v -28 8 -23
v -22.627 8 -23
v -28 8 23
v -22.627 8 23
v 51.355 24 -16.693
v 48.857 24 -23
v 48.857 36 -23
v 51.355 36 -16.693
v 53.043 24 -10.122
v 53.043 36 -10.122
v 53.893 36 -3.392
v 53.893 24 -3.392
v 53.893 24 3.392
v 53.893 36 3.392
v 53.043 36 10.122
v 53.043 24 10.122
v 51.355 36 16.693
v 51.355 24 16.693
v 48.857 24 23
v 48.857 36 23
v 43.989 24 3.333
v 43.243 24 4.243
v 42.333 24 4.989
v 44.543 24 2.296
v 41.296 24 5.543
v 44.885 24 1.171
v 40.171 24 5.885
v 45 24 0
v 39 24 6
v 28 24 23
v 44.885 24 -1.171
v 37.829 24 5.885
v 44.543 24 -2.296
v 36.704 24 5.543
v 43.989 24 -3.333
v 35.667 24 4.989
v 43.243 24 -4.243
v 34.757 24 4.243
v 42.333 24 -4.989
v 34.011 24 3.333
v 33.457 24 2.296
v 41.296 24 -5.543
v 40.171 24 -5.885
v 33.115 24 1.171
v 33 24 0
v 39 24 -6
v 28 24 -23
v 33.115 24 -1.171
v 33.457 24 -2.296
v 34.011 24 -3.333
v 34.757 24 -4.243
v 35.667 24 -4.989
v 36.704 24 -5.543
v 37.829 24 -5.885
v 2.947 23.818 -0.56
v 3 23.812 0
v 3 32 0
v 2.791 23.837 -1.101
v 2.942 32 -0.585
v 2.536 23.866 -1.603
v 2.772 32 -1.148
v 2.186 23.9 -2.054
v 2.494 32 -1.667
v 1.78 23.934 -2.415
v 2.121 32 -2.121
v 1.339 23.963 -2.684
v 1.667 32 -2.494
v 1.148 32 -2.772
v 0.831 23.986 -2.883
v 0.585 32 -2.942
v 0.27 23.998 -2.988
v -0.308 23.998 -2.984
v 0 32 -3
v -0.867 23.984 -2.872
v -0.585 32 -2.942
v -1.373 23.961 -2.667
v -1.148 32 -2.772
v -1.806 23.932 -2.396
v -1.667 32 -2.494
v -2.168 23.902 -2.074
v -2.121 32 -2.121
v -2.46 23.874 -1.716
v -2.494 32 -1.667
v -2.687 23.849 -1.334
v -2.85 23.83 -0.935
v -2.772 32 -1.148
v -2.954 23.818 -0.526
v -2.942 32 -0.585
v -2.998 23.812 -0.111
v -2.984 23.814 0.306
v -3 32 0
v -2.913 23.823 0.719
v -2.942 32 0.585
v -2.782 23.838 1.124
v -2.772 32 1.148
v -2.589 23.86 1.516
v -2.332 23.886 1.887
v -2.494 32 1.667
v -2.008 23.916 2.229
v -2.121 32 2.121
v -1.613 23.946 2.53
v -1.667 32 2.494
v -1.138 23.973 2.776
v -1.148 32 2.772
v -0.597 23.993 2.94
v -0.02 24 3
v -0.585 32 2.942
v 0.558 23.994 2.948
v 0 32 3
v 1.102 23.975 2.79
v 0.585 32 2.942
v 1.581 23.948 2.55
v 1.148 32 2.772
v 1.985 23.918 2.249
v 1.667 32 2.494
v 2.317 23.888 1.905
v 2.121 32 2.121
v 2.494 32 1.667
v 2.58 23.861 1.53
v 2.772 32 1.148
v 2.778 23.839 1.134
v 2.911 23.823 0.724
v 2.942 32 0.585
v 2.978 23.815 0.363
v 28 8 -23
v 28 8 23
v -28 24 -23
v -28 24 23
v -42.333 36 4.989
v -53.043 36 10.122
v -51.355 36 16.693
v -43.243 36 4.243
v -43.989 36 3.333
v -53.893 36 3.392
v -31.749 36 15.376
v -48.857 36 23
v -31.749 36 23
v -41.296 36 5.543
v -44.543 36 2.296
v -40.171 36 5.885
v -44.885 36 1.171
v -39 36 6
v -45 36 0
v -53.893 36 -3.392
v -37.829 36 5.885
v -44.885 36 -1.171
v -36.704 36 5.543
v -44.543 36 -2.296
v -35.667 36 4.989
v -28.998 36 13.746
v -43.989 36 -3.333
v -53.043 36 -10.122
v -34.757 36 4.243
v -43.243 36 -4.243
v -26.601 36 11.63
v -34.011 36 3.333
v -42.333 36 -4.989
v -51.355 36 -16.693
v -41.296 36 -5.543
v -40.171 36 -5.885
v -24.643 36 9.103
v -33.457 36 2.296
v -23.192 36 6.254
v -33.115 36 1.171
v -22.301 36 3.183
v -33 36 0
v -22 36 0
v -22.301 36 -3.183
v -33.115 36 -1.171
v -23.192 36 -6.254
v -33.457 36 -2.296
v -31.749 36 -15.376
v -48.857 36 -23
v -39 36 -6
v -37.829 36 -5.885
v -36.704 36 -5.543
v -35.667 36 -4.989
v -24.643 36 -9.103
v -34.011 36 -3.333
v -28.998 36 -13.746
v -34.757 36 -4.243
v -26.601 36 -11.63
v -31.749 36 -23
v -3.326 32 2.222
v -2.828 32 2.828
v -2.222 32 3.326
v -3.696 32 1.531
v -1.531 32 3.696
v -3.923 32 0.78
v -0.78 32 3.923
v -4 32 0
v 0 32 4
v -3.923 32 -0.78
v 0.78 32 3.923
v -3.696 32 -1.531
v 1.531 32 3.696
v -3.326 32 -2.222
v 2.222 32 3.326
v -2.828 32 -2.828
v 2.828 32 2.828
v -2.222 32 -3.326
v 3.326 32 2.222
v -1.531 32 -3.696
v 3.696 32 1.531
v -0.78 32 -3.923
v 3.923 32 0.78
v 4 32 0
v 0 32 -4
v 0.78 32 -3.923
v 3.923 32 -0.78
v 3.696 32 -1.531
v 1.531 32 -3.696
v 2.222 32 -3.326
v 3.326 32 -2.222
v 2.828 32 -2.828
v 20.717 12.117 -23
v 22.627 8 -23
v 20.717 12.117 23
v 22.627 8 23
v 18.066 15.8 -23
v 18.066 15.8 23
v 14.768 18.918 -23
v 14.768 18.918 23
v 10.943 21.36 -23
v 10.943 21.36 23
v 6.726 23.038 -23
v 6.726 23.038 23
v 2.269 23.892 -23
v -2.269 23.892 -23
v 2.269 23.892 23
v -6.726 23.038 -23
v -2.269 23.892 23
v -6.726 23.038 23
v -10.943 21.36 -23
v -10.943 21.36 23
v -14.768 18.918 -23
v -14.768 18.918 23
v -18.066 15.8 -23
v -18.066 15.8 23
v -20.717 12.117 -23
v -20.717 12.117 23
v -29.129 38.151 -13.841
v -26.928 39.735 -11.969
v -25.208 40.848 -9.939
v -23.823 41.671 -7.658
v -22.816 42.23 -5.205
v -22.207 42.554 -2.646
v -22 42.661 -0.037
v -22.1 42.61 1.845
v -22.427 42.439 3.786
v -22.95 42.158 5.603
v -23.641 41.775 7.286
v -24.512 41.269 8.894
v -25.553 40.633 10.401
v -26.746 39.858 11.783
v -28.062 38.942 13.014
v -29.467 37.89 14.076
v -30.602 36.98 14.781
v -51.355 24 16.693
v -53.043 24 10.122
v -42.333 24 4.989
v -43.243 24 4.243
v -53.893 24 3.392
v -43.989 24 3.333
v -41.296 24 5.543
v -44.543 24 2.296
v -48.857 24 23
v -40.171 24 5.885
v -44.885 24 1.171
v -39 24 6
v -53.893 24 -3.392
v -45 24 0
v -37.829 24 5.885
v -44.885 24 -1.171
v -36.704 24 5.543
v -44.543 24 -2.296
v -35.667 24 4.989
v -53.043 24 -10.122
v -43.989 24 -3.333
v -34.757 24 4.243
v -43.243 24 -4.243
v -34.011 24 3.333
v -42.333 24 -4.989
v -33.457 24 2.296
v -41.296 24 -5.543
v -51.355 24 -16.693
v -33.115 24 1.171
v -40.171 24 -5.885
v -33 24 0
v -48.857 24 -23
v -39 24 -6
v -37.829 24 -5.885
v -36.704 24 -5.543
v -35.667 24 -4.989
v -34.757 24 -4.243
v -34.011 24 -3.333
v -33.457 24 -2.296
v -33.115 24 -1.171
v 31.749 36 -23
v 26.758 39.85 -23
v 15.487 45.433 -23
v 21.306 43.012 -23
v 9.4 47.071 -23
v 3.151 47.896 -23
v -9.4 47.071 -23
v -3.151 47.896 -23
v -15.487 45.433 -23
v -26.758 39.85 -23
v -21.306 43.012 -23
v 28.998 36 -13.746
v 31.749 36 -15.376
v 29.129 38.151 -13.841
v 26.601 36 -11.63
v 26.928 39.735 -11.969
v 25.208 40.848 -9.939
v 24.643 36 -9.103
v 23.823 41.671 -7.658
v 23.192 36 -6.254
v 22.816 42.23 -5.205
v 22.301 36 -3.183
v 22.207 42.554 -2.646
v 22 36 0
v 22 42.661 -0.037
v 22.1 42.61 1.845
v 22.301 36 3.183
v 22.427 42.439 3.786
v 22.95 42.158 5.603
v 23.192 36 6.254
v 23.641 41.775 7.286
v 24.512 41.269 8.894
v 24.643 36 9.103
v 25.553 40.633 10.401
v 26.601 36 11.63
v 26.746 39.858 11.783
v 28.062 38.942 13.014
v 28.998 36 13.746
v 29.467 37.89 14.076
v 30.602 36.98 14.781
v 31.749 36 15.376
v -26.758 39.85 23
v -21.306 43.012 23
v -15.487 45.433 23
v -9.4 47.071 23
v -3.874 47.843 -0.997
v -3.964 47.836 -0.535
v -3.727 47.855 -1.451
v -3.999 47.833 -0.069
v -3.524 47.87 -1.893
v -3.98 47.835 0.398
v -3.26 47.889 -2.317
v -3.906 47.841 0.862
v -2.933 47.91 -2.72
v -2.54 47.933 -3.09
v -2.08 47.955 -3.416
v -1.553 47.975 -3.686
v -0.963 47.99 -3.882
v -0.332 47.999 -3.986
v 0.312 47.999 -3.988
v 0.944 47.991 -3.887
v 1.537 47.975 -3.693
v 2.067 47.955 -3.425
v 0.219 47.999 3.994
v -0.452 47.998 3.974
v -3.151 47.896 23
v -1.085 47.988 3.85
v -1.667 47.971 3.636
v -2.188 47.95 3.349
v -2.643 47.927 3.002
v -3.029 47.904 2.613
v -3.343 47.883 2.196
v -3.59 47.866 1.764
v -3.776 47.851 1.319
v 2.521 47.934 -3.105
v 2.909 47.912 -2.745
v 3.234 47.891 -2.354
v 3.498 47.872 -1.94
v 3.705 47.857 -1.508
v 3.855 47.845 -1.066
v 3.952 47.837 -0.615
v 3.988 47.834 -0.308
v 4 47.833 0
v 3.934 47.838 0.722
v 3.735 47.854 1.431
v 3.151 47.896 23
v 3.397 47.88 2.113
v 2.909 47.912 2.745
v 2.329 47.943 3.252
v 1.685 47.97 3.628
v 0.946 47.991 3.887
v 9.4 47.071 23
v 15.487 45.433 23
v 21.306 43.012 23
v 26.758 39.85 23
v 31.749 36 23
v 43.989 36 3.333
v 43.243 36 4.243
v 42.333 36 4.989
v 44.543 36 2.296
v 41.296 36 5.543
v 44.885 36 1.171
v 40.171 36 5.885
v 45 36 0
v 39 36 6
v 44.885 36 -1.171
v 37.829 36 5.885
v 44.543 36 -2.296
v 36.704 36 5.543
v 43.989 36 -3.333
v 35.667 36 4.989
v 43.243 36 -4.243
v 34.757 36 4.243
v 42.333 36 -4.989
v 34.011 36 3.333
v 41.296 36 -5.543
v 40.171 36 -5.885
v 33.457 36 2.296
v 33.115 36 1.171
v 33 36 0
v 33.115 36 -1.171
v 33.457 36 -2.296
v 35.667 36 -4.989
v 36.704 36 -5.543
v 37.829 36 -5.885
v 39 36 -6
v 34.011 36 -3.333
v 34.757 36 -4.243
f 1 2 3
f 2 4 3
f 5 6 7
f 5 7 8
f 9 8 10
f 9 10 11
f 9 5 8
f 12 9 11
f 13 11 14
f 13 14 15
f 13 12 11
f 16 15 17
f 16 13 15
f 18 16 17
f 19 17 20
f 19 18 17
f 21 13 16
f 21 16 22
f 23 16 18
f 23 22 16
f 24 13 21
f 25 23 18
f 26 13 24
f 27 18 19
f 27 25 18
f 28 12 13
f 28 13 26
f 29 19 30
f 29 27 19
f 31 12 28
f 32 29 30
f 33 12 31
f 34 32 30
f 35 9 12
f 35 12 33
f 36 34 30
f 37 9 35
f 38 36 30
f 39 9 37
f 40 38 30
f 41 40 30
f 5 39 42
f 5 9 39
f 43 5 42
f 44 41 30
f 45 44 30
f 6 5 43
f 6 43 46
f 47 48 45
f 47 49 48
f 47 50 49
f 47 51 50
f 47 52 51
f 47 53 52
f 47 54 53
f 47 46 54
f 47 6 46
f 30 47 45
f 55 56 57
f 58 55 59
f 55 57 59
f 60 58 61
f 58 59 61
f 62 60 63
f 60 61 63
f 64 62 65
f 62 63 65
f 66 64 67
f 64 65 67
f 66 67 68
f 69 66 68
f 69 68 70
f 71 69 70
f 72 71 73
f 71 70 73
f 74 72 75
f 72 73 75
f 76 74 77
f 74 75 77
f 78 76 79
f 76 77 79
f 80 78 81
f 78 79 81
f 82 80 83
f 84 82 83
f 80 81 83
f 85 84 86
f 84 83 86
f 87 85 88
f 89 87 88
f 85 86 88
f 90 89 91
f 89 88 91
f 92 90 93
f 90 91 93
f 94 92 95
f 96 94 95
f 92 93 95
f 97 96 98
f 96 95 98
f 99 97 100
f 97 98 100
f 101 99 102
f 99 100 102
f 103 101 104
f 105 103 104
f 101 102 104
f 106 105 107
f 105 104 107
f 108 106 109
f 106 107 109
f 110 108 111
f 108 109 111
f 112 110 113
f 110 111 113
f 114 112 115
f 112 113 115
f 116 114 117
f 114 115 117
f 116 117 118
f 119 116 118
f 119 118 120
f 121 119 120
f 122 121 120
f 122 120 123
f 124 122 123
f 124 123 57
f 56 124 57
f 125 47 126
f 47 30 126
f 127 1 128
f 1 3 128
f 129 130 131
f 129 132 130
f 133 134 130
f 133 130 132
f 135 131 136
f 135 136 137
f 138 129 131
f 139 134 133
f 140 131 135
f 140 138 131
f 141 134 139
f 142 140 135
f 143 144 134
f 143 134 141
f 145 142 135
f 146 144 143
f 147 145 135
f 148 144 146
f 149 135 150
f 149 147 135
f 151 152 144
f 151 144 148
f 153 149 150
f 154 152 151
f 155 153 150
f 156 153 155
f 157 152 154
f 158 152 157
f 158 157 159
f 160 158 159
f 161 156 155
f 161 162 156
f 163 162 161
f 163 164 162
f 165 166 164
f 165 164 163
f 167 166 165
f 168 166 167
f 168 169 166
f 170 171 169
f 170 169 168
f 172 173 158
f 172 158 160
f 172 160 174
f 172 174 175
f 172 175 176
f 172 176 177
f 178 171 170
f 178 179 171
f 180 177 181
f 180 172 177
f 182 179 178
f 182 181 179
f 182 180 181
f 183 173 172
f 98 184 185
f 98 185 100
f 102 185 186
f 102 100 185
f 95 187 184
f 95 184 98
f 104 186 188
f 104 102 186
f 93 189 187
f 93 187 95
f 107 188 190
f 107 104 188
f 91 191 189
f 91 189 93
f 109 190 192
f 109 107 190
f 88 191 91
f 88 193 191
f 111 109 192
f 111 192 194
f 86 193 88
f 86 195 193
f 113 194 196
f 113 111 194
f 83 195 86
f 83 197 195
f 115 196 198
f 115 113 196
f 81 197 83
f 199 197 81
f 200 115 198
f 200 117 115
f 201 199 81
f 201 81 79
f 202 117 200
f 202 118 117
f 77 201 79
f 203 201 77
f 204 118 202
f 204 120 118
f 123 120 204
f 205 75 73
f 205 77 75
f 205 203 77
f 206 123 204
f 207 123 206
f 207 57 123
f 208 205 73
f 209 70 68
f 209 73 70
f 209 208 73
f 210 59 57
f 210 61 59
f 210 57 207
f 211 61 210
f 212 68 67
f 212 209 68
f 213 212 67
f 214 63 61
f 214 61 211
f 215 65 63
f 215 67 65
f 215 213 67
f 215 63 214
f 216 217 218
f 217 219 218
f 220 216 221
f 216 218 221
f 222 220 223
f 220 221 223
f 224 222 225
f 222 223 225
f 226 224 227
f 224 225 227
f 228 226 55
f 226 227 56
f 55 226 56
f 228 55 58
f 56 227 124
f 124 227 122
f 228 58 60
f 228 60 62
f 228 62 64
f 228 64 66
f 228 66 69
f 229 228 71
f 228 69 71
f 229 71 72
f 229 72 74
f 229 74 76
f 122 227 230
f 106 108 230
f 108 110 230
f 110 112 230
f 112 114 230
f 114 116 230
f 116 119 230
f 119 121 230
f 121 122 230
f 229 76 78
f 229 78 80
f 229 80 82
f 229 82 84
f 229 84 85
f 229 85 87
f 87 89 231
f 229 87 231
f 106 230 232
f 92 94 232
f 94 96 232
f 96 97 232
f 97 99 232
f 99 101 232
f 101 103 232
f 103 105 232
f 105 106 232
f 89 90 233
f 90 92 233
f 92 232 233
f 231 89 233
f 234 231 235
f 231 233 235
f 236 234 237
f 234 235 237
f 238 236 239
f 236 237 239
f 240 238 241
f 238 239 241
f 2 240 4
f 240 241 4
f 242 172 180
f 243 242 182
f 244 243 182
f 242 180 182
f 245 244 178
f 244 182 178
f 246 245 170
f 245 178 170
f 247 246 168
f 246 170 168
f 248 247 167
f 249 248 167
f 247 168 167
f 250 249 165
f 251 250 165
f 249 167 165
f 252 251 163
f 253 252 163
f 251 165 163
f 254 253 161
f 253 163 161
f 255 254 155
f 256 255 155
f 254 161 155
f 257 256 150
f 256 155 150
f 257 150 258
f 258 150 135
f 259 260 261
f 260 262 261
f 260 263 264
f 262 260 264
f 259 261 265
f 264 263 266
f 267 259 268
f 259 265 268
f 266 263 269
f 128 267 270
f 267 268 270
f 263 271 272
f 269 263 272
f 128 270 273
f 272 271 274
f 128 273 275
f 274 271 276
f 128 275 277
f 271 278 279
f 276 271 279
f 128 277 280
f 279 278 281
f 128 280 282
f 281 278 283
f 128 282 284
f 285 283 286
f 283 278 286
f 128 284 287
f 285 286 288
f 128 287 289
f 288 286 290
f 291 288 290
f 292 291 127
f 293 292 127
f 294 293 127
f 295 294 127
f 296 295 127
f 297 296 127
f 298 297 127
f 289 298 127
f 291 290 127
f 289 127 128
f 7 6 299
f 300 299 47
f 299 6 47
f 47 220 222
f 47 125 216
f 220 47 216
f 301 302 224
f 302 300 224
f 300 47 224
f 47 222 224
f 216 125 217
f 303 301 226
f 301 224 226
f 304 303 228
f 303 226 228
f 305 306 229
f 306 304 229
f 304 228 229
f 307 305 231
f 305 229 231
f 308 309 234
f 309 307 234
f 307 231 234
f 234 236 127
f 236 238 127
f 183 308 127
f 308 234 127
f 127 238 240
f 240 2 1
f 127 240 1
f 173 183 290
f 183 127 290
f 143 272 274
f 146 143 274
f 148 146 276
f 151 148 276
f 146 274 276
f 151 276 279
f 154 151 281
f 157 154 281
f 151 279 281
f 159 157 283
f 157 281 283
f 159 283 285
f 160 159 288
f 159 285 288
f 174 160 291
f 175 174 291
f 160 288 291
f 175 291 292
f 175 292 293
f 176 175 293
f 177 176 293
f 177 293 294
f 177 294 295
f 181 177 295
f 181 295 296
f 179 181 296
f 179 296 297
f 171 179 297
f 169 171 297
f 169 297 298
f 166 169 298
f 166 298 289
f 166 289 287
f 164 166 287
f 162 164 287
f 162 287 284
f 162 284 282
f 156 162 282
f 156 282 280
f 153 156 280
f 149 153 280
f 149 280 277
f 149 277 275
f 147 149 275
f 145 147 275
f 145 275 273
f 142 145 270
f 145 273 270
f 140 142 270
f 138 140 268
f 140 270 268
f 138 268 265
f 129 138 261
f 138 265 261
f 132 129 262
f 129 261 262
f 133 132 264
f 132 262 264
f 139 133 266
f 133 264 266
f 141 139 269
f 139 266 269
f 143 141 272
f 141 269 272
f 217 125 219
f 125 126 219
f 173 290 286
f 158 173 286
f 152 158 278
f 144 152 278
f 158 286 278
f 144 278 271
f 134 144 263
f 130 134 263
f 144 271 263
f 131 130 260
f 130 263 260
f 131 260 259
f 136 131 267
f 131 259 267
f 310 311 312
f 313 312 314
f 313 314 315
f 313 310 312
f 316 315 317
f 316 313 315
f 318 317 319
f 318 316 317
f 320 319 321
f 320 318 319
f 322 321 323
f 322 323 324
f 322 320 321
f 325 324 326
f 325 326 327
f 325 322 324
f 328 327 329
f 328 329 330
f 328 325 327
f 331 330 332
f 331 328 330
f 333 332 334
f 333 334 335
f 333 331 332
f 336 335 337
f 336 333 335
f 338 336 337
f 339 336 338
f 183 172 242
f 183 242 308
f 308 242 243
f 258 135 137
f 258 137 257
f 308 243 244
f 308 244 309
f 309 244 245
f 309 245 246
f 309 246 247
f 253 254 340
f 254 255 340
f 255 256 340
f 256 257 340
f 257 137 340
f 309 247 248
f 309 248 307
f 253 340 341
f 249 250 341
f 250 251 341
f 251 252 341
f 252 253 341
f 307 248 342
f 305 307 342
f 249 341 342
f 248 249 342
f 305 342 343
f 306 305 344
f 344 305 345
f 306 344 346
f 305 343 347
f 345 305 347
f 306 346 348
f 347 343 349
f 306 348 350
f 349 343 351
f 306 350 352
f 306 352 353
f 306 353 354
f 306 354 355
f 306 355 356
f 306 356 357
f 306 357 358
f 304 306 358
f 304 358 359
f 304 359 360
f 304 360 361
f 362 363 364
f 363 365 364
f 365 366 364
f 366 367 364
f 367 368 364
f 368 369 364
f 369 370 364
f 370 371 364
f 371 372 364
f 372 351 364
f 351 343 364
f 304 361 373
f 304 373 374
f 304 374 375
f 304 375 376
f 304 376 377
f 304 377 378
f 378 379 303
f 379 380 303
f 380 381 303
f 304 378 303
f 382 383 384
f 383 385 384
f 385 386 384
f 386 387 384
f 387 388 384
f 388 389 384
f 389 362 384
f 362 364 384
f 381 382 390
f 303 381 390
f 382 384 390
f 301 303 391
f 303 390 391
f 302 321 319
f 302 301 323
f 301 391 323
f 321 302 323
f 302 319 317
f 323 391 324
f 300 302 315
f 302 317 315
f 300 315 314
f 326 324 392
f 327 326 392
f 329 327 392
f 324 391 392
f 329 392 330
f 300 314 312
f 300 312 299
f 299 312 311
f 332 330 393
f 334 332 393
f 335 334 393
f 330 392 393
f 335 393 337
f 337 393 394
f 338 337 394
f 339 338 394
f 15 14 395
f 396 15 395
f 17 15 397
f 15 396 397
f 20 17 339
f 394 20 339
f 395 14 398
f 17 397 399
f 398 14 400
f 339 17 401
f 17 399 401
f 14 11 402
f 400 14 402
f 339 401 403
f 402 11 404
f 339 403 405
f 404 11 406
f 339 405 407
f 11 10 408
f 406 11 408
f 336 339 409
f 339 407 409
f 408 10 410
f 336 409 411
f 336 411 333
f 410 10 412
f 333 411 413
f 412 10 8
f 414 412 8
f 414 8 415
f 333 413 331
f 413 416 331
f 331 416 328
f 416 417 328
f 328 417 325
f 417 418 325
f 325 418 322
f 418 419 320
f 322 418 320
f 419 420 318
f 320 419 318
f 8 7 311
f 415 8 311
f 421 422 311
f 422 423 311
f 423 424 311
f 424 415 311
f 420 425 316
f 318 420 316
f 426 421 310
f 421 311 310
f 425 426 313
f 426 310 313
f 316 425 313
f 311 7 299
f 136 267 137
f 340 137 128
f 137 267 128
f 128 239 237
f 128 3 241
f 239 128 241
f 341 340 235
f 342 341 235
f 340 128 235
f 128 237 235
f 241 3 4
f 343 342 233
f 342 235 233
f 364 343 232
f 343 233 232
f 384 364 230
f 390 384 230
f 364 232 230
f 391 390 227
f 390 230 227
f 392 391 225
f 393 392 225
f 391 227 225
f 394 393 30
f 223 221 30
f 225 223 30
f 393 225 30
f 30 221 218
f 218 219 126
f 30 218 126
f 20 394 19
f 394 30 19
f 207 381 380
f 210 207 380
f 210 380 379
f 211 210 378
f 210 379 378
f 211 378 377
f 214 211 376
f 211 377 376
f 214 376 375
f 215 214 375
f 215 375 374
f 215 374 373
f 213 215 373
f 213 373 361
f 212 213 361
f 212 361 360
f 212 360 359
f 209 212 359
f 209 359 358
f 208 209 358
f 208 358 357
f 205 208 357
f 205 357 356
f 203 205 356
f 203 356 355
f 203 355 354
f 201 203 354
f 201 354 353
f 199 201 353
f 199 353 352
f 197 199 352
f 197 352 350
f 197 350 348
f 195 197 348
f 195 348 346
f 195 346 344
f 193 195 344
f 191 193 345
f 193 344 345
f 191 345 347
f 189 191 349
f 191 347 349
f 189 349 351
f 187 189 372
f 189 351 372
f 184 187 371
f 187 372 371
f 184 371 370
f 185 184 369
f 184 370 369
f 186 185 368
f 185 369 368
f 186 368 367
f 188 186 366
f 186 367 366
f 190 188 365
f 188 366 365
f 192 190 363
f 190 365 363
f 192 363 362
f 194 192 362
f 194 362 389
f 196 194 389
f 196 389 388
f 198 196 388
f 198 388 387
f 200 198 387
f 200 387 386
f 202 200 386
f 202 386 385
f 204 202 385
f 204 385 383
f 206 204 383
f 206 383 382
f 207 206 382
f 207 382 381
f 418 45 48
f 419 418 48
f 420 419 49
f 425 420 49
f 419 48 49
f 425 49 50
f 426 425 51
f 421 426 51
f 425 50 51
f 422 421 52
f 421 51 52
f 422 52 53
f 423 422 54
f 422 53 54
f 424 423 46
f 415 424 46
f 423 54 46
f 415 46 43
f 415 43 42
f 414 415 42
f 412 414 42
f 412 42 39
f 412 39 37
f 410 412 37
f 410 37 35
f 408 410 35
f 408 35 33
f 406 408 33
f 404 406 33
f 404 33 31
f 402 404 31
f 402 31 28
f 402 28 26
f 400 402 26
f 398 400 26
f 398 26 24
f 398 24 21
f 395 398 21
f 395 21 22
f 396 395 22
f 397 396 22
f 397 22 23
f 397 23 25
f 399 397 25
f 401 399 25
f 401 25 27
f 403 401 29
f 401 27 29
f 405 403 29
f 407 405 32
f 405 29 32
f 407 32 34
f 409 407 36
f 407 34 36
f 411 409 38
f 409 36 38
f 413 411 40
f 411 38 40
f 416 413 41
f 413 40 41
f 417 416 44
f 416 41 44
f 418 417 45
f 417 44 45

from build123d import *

# Parameters (mm, degrees)
BOSS_EXTRUDE1_DEPTH     = 23
BOSS_EXTRUDE4_START     = 24
BOSS_EXTRUDE4_DEPTH     = 12
SKETCH4_R               = 3
CUT_EXTRUDE1_DEPTH      = 13
CUT_EXTRUDE1_DEPTH_BACK = 29
SKETCH5_R               = 4
CUT_EXTRUDE2_DEPTH      = 16
F_12_0MM_DOWEL_HOLE1_D  = 12
CUT_EXTRUDE3_DEPTH      = 16


with BuildPart() as part:
    # Sketch1 → Boss-Extrude1 (new body, symmetric)
    with BuildSketch(Plane.XY):
        with BuildLine():
            Line((31.749015733, 36), (31.749015733, 24))
            Line((31.749015733, 24), (28, 24))
            Line((28, 24), (28, 8))
            Line((28, 8), (22.627416998, 8))
            ThreePointArc((22.627416998, 8), (0, 24), (-22.627416998, 8))
            Line((-22.627416998, 8), (-28, 8))
            Line((-28, 8), (-28, 24))
            Line((-28, 24), (-31.749015733, 24))
            Line((-31.749015733, 24), (-31.749015733, 36))
            ThreePointArc((-31.749015733, 36), (0, 48), (31.749015733, 36))
        make_face()
    extrude(amount=BOSS_EXTRUDE1_DEPTH, both=True)

    # Sketch3 → Boss-Extrude4 (add)
    with BuildSketch(Plane(origin=(0, 0, 0), x_dir=(1, 0, 0), z_dir=(0, 1, 0)).offset(BOSS_EXTRUDE4_START)):
        with BuildLine():
            Line((31.749015733, -23), (31.749015733, 23))
            Line((31.749015733, 23), (48.856934001, 23))
            ThreePointArc((48.856934001, 23), (54, 0), (48.856934001, -23))
            Line((48.856934001, -23), (31.749015733, -23))
        make_face()
    boss_extrude4 = extrude(amount=BOSS_EXTRUDE4_DEPTH)

    # Mirror2: Boss-Extrude4 across plane
    add(boss_extrude4.mirror(Plane(origin=(0, 0, 0), x_dir=(0, 0, 1), z_dir=(1, 0, 0))))

    # Sketch4 → Cut-Extrude1 (cut, two sides)
    with BuildSketch(Plane(origin=(0, 36, 0), x_dir=(1, 0, 0), z_dir=(0, 1, 0))) as cut_extrude1_sk:
        Circle(SKETCH4_R)
    extrude(amount=CUT_EXTRUDE1_DEPTH, mode=Mode.SUBTRACT)
    extrude(cut_extrude1_sk.sketch, amount=-CUT_EXTRUDE1_DEPTH_BACK, mode=Mode.SUBTRACT)

    # Sketch5 → Cut-Extrude2 (cut)
    with BuildSketch(Plane(origin=(0, 48, 0), x_dir=(1, 0, 0), z_dir=(0, 1, 0))):
        Circle(SKETCH5_R)
    extrude(amount=-CUT_EXTRUDE2_DEPTH, mode=Mode.SUBTRACT)

    # Ø12.0mm Dowel Hole1 (through all)
    with Locations(Plane(origin=(0, 36, 0), x_dir=(1, 0, 0), z_dir=(0, 1, 0))):
        with Locations((-39, 0), (39, 0)):
            Hole(F_12_0MM_DOWEL_HOLE1_D / 2)

    # Sketch8 → Cut-Extrude3 (cut)
    with BuildSketch(Plane(origin=(0, 36, 0), x_dir=(1, 0, 0), z_dir=(0, 1, 0))):
        with BuildLine():
            Line((31.749015733, -15.376060196), (31.749015733, 15.376060196))
            ThreePointArc((31.749015733, 15.376060196), (22, 0), (31.749015733, -15.376060196))
        make_face()
    cut_extrude3 = extrude(amount=CUT_EXTRUDE3_DEPTH, mode=Mode.SUBTRACT)

    # Mirror3: Cut-Extrude3 across plane
    add(cut_extrude3.mirror(Plane(origin=(0, 0, 0), x_dir=(0, 0, 1), z_dir=(1, 0, 0))), mode=Mode.SUBTRACT)


solid = part.part
